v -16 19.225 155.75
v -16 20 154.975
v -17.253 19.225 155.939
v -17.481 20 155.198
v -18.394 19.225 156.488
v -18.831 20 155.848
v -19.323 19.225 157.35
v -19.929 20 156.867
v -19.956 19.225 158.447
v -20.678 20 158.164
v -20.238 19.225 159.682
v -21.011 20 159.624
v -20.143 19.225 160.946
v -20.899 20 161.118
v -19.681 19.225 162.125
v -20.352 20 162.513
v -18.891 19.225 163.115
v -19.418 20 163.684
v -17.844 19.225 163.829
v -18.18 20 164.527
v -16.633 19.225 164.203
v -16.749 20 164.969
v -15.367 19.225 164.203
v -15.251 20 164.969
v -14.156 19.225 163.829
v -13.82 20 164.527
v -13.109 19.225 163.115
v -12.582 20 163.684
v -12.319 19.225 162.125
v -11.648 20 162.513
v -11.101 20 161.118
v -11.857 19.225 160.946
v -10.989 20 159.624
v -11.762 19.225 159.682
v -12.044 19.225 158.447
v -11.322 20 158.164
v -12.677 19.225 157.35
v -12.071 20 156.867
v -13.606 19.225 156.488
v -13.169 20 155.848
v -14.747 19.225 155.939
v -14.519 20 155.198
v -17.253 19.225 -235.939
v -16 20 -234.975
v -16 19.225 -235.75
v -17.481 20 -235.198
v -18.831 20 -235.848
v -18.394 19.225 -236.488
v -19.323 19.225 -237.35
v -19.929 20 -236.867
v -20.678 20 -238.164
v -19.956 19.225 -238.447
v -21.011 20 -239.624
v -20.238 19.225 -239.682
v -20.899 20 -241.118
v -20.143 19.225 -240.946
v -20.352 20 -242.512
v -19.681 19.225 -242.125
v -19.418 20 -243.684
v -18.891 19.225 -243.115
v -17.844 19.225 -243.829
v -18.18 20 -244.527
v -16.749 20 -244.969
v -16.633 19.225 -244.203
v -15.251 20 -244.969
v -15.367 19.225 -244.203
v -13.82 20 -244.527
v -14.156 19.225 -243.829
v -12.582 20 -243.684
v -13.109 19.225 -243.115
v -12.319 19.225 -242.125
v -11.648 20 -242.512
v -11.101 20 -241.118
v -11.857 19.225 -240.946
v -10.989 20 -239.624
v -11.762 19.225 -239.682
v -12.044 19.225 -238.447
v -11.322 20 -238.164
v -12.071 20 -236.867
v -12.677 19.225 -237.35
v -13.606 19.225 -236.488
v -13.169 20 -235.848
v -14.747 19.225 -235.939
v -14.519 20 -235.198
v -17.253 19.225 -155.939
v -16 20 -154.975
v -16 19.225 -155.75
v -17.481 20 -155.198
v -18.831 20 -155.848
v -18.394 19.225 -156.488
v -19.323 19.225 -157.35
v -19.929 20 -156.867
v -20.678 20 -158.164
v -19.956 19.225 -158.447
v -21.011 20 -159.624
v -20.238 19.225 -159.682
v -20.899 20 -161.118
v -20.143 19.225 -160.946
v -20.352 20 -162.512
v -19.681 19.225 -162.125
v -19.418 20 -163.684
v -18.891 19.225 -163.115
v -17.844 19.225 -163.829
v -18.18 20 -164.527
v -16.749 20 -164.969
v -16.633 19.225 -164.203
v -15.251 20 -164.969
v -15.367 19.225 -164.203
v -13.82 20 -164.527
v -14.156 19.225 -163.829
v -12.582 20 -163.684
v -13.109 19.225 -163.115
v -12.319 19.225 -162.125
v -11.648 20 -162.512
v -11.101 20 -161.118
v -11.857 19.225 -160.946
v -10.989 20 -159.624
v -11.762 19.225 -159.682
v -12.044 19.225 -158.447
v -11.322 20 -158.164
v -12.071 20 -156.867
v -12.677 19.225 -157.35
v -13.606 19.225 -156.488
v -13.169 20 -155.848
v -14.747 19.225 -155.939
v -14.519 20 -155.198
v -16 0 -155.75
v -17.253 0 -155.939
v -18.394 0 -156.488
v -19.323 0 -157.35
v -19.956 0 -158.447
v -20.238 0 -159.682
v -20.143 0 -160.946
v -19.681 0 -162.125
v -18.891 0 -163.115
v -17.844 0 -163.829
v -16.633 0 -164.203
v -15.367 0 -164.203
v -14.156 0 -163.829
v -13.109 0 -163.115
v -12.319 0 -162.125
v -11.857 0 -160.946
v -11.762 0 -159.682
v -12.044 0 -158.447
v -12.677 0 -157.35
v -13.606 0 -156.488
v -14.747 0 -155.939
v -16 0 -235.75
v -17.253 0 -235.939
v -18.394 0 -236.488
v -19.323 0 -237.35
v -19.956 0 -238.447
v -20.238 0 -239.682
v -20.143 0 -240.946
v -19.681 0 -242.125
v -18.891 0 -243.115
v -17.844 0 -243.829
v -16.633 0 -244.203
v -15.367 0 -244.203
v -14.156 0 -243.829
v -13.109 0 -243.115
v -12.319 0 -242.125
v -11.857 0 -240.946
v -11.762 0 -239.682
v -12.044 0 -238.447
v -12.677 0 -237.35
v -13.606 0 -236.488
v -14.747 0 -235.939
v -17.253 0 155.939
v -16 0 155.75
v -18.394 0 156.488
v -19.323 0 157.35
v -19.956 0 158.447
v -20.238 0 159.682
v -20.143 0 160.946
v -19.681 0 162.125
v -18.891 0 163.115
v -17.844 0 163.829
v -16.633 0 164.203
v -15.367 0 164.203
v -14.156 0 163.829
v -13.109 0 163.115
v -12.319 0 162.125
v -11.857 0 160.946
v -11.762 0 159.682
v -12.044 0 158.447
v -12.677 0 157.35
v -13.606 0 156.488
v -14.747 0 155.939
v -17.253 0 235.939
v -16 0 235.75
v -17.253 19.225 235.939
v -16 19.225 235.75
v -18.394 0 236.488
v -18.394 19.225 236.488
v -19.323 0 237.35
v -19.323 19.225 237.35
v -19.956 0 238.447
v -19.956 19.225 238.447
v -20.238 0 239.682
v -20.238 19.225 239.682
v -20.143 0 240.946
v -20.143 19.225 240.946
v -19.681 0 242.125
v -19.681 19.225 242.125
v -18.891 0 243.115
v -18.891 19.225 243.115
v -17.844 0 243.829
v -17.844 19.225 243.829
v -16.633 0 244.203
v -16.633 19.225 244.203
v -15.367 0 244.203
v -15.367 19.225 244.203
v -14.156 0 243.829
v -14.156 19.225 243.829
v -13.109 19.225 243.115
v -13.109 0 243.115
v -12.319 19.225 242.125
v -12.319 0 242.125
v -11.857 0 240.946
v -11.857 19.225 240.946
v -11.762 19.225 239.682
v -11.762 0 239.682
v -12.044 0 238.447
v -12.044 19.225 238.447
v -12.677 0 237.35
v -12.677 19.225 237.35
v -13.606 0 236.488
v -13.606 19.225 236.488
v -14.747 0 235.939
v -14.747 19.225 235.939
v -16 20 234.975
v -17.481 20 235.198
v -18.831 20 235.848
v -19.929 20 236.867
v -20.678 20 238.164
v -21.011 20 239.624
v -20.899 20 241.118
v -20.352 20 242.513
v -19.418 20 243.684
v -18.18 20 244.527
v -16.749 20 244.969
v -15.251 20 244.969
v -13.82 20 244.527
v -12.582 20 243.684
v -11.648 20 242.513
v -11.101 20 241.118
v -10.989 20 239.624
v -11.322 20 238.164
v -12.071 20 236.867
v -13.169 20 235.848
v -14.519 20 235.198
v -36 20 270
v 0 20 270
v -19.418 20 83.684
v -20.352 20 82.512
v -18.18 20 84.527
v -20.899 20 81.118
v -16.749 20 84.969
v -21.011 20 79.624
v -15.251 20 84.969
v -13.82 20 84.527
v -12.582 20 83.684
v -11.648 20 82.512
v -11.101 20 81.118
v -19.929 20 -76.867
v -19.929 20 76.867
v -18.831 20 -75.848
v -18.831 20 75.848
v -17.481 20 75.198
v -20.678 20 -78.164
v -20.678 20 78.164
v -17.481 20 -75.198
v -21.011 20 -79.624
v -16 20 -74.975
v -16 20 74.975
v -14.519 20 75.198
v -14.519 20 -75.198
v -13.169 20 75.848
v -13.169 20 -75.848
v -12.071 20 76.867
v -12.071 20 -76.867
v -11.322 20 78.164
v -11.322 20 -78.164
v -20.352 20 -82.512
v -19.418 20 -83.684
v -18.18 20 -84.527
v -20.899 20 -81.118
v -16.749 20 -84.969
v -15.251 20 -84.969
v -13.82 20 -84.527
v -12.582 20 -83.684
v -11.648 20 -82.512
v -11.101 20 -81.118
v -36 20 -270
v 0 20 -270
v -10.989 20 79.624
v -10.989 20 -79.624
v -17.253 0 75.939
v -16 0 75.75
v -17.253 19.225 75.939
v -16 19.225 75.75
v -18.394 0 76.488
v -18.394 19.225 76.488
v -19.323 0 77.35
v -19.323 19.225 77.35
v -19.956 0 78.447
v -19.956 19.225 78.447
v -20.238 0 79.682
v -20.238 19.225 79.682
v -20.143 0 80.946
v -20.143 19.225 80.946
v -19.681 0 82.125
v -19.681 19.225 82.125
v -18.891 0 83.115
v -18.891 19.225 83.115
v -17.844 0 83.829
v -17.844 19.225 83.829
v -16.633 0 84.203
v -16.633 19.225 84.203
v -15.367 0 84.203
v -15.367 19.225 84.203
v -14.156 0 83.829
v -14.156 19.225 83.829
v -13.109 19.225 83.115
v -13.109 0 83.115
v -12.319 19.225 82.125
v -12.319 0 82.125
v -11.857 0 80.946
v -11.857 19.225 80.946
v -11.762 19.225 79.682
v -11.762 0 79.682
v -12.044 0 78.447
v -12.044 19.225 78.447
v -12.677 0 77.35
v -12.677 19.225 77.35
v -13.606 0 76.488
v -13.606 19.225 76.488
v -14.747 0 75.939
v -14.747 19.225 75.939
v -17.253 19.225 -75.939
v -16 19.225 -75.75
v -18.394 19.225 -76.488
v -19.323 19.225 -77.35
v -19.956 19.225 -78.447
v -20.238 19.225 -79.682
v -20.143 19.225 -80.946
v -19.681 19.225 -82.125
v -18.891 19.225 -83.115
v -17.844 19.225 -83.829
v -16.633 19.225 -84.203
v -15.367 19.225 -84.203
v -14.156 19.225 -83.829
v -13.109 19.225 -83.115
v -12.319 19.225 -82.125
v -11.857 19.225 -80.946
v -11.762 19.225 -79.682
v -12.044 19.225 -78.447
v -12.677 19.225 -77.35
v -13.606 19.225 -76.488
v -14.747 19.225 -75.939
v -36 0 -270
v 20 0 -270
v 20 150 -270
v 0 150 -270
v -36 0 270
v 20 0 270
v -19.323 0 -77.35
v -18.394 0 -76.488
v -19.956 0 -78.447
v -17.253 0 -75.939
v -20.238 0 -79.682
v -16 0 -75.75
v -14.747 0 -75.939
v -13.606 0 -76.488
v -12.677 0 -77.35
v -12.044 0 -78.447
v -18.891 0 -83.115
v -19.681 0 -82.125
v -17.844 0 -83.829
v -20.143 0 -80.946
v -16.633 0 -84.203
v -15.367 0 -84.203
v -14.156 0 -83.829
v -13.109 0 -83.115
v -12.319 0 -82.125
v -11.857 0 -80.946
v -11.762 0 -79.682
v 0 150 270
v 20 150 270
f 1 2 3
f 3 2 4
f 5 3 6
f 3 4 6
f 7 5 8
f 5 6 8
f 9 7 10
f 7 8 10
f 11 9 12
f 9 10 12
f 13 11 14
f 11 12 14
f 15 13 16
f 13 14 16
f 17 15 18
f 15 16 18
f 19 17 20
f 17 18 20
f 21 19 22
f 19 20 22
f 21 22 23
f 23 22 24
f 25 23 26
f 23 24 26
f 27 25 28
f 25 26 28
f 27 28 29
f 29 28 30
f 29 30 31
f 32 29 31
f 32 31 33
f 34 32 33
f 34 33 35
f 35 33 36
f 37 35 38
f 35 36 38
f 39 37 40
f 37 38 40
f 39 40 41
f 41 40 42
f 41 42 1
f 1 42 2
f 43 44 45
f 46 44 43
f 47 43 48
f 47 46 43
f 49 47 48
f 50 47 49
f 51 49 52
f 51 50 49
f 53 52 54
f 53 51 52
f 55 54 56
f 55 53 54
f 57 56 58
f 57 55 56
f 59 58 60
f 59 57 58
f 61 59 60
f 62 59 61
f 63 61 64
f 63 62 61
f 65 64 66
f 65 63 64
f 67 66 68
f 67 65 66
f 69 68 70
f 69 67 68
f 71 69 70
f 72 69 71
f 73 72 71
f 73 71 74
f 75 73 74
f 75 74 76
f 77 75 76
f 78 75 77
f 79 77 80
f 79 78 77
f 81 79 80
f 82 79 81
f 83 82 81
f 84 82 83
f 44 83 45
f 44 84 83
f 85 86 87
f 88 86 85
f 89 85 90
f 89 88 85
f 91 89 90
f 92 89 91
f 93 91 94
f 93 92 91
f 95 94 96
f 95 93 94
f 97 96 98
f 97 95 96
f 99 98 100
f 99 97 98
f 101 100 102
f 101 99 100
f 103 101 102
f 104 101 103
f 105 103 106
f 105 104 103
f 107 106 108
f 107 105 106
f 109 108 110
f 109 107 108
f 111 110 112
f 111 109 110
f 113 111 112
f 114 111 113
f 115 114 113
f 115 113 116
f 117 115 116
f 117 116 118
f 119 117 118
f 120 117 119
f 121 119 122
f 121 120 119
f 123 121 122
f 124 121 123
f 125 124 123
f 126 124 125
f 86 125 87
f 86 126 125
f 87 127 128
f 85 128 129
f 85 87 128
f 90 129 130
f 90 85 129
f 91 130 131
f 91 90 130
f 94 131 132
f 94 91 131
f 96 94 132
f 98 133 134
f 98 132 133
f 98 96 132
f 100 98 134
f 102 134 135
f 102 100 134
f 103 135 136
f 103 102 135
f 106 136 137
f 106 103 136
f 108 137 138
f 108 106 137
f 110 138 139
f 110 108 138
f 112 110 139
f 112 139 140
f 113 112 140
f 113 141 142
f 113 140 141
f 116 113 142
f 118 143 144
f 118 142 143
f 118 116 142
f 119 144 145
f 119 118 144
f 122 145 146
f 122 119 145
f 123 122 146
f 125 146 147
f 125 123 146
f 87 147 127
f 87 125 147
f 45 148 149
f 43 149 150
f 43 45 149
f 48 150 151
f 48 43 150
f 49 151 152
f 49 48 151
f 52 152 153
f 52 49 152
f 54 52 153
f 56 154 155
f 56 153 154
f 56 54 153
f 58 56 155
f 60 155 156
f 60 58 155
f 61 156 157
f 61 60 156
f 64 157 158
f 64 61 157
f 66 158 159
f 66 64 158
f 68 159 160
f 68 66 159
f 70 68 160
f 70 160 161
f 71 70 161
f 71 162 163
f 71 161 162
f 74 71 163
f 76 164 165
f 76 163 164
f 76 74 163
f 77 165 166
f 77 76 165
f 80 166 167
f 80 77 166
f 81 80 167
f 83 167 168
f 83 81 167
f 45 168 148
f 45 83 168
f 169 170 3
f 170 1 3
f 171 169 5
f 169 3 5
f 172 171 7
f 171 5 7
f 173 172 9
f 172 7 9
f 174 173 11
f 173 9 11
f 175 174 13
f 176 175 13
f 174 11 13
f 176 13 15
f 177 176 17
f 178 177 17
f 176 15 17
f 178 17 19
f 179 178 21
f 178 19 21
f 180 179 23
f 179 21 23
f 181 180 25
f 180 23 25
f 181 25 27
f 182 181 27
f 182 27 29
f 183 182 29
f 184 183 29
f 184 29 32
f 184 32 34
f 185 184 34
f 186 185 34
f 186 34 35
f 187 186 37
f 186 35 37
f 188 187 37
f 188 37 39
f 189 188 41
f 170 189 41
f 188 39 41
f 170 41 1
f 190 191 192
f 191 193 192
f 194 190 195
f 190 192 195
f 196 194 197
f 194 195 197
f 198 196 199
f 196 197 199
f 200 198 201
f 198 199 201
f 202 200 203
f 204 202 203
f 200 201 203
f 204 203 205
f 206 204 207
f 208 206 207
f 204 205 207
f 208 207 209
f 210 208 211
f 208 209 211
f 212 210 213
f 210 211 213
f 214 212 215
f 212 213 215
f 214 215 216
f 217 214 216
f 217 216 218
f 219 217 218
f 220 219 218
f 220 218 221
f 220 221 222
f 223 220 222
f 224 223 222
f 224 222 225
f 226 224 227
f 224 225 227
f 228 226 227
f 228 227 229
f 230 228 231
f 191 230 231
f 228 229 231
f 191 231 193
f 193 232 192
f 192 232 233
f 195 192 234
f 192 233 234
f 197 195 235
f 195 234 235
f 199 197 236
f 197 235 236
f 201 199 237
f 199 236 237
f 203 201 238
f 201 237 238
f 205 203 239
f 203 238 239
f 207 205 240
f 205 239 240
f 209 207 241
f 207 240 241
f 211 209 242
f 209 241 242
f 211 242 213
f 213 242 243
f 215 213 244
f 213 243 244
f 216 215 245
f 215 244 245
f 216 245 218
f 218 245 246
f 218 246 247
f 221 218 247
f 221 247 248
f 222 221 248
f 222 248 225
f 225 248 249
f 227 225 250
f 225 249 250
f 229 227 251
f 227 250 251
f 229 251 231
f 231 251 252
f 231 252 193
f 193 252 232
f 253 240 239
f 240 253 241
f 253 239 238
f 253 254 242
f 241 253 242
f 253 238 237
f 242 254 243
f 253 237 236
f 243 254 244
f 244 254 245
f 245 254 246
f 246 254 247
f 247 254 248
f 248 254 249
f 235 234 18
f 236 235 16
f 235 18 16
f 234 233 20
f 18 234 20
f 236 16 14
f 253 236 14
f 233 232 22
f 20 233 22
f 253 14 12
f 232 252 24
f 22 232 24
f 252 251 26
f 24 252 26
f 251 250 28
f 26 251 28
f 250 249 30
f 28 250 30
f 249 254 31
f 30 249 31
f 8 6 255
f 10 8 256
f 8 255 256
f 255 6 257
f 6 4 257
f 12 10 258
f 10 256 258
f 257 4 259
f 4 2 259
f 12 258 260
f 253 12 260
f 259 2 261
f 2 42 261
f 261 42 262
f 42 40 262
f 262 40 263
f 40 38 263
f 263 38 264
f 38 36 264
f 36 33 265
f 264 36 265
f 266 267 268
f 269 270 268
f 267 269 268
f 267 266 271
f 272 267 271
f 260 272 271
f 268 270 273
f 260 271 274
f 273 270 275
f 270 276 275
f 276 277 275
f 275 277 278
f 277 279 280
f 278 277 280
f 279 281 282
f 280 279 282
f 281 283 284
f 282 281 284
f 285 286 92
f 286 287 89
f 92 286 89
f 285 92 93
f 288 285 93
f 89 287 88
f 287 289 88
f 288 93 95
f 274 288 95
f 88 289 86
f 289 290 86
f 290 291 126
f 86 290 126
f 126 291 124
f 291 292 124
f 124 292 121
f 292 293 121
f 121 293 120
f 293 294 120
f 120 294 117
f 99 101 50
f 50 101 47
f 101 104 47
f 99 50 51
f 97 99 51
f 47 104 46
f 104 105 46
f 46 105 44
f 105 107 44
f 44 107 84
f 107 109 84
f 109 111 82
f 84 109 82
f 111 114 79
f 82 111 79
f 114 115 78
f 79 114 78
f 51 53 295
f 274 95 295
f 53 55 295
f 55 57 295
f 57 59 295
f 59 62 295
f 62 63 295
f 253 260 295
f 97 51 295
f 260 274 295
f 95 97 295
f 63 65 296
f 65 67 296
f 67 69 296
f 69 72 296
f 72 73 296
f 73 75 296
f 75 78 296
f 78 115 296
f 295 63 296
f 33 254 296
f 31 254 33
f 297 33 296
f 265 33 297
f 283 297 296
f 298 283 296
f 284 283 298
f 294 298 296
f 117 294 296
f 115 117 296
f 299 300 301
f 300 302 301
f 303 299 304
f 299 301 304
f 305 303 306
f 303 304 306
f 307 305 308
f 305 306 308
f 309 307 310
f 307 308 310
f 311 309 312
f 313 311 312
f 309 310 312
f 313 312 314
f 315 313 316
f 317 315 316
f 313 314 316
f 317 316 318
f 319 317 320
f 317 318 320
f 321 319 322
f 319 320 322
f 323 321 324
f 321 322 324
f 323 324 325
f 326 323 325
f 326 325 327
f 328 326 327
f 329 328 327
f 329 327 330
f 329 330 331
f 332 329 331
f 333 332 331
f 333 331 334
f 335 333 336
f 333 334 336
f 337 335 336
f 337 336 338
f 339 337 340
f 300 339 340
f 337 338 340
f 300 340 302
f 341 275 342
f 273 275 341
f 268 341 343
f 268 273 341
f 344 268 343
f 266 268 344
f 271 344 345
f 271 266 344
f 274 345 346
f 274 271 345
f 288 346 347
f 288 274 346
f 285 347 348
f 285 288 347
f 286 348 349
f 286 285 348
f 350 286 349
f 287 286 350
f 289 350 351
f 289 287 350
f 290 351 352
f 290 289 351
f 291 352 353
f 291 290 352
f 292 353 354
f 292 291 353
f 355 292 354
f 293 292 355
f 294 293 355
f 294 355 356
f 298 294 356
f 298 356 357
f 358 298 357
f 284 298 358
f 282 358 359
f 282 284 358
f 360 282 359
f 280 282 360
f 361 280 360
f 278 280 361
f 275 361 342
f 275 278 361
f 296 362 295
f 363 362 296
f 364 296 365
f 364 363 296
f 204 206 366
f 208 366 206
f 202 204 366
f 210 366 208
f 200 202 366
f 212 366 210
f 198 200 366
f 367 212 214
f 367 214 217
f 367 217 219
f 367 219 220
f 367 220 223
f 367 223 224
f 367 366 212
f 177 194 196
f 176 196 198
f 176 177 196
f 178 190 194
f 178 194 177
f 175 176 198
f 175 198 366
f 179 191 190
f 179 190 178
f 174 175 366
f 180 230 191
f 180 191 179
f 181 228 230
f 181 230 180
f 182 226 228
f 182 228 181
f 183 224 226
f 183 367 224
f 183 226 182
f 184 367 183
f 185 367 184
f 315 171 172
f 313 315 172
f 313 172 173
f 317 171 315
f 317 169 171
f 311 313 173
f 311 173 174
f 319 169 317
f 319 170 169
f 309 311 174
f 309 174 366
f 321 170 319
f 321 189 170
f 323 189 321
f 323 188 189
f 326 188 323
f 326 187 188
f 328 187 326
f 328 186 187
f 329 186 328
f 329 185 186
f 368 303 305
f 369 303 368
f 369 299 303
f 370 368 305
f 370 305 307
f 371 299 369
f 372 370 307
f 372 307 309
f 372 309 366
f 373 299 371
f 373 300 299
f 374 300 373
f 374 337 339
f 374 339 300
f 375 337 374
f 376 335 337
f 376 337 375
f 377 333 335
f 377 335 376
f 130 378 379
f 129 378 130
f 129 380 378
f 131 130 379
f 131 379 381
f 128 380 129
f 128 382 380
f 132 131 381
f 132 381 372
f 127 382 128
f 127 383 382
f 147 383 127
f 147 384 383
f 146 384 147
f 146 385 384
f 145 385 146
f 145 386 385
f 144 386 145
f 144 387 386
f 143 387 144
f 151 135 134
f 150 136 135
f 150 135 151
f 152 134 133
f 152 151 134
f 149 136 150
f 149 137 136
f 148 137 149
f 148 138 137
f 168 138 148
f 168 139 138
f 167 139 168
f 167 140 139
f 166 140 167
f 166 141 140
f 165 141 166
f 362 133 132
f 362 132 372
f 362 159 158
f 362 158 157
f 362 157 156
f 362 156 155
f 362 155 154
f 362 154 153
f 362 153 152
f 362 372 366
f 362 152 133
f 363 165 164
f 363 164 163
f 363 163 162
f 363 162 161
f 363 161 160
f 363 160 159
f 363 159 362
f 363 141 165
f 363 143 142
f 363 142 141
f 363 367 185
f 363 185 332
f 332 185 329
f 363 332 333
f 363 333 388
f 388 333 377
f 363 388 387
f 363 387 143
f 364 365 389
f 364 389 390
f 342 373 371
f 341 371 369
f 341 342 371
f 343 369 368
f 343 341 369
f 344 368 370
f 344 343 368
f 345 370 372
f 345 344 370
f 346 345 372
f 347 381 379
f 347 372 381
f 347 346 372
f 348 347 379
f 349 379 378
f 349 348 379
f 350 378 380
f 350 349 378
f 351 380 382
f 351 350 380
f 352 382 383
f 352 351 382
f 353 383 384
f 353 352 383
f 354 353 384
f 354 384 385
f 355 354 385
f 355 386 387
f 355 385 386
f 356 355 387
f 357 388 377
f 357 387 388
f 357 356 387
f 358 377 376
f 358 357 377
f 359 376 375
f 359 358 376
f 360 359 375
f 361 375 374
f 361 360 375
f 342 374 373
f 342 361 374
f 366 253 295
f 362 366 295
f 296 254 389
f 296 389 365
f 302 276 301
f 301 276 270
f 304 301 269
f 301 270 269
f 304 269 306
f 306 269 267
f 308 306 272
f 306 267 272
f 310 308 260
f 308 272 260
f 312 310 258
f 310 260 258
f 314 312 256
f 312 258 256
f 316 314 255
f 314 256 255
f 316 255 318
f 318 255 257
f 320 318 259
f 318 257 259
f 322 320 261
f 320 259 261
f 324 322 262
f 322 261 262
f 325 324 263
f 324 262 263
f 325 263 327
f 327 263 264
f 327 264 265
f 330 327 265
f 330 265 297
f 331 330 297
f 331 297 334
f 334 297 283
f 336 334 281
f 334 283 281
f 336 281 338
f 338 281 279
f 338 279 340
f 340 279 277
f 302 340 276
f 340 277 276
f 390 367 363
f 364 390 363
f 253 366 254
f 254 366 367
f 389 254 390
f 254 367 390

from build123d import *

# Parameters (mm, degrees)
SKETCH1_W                   = 20
SKETCH1_H                   = 540
BOSS_EXTRUDE1_DEPTH         = 150
SKETCH2_W                   = 540
SKETCH2_H                   = 20
BOSS_EXTRUDE2_DEPTH         = 36
M10_TAPPED_HOLE1_AT_2_COUNT = 2
M10_TAPPED_HOLE1_AT_2_PITCH = 80
M10_TAPPED_HOLE1_AT_3_COUNT = 2
M10_TAPPED_HOLE1_AT_3_PITCH = 160


with BuildPart() as part:
    # Sketch1 → Boss-Extrude1 (new body)
    with BuildSketch(Plane(origin=(0, 0, 0), x_dir=(1, 0, 0), z_dir=(0, 1, 0))):
        with Locations((10, 0)):
            Rectangle(SKETCH1_W, SKETCH1_H)
    extrude(amount=BOSS_EXTRUDE1_DEPTH)

    # Sketch2 → Boss-Extrude2 (add)
    with BuildSketch(Plane(origin=(0, 0, 0), x_dir=(0, 0, -1), z_dir=(1, 0, 0))):
        with Locations((0, 10)):
            Rectangle(SKETCH2_W, SKETCH2_H)
    extrude(amount=-BOSS_EXTRUDE2_DEPTH)

    # Sketch6 → M10 Tapped Hole1 (revolve, cut)
    with BuildSketch(Plane(origin=(-16, 20, -80), x_dir=(0, 0, 1), z_dir=(1, 0, 0))):
        Polygon((0, 0), (0, 27.5), (4.25, 24.946342369), (4.25, 0.775), (5.025, 0), align=None)
    m10_tapped_hole1 = revolve(axis=Axis((-16, 26.35, -80), (0, -1, 0)), mode=Mode.SUBTRACT)

    # M10 Tapped Hole1 at 2: M10 Tapped Hole1 ×2
    with Locations(*[(0, 0, -i * M10_TAPPED_HOLE1_AT_2_PITCH) for i in range(1, M10_TAPPED_HOLE1_AT_2_COUNT)]):
        add(m10_tapped_hole1, mode=Mode.SUBTRACT)

    # M10 Tapped Hole1 at 3: M10 Tapped Hole1 ×2
    with Locations(*[(0, 0, -i * M10_TAPPED_HOLE1_AT_3_PITCH) for i in range(1, M10_TAPPED_HOLE1_AT_3_COUNT)]):
        add(m10_tapped_hole1, mode=Mode.SUBTRACT)

    # Mirror1: M10 Tapped Hole1 across plane
    add(m10_tapped_hole1.mirror(Plane.XY), mode=Mode.SUBTRACT)

    # Mirror1 copy 1 sketch → Mirror1 copy 1 (revolve, cut)
    with BuildSketch(Plane(origin=(-16, 20, 160), x_dir=(0, 0, -1), z_dir=(1, 0, 0))):
        Polygon((0, 0), (0, -27.5), (4.25, -24.946342369), (4.25, -0.775), (5.025, 0), align=None)
    revolve(axis=Axis((-16, 26.35, 160), (0, 1, 0)), mode=Mode.SUBTRACT)

    # Mirror1 copy 2 sketch → Mirror1 copy 2 (revolve, cut)
    with BuildSketch(Plane(origin=(-16, 20, 240), x_dir=(0, 0, -1), z_dir=(1, 0, 0))):
        Polygon((0, 0), (0, -27.5), (4.25, -24.946342369), (4.25, -0.775), (5.025, 0), align=None)
    revolve(axis=Axis((-16, 26.35, 240), (0, 1, 0)), mode=Mode.SUBTRACT)


solid = part.part
